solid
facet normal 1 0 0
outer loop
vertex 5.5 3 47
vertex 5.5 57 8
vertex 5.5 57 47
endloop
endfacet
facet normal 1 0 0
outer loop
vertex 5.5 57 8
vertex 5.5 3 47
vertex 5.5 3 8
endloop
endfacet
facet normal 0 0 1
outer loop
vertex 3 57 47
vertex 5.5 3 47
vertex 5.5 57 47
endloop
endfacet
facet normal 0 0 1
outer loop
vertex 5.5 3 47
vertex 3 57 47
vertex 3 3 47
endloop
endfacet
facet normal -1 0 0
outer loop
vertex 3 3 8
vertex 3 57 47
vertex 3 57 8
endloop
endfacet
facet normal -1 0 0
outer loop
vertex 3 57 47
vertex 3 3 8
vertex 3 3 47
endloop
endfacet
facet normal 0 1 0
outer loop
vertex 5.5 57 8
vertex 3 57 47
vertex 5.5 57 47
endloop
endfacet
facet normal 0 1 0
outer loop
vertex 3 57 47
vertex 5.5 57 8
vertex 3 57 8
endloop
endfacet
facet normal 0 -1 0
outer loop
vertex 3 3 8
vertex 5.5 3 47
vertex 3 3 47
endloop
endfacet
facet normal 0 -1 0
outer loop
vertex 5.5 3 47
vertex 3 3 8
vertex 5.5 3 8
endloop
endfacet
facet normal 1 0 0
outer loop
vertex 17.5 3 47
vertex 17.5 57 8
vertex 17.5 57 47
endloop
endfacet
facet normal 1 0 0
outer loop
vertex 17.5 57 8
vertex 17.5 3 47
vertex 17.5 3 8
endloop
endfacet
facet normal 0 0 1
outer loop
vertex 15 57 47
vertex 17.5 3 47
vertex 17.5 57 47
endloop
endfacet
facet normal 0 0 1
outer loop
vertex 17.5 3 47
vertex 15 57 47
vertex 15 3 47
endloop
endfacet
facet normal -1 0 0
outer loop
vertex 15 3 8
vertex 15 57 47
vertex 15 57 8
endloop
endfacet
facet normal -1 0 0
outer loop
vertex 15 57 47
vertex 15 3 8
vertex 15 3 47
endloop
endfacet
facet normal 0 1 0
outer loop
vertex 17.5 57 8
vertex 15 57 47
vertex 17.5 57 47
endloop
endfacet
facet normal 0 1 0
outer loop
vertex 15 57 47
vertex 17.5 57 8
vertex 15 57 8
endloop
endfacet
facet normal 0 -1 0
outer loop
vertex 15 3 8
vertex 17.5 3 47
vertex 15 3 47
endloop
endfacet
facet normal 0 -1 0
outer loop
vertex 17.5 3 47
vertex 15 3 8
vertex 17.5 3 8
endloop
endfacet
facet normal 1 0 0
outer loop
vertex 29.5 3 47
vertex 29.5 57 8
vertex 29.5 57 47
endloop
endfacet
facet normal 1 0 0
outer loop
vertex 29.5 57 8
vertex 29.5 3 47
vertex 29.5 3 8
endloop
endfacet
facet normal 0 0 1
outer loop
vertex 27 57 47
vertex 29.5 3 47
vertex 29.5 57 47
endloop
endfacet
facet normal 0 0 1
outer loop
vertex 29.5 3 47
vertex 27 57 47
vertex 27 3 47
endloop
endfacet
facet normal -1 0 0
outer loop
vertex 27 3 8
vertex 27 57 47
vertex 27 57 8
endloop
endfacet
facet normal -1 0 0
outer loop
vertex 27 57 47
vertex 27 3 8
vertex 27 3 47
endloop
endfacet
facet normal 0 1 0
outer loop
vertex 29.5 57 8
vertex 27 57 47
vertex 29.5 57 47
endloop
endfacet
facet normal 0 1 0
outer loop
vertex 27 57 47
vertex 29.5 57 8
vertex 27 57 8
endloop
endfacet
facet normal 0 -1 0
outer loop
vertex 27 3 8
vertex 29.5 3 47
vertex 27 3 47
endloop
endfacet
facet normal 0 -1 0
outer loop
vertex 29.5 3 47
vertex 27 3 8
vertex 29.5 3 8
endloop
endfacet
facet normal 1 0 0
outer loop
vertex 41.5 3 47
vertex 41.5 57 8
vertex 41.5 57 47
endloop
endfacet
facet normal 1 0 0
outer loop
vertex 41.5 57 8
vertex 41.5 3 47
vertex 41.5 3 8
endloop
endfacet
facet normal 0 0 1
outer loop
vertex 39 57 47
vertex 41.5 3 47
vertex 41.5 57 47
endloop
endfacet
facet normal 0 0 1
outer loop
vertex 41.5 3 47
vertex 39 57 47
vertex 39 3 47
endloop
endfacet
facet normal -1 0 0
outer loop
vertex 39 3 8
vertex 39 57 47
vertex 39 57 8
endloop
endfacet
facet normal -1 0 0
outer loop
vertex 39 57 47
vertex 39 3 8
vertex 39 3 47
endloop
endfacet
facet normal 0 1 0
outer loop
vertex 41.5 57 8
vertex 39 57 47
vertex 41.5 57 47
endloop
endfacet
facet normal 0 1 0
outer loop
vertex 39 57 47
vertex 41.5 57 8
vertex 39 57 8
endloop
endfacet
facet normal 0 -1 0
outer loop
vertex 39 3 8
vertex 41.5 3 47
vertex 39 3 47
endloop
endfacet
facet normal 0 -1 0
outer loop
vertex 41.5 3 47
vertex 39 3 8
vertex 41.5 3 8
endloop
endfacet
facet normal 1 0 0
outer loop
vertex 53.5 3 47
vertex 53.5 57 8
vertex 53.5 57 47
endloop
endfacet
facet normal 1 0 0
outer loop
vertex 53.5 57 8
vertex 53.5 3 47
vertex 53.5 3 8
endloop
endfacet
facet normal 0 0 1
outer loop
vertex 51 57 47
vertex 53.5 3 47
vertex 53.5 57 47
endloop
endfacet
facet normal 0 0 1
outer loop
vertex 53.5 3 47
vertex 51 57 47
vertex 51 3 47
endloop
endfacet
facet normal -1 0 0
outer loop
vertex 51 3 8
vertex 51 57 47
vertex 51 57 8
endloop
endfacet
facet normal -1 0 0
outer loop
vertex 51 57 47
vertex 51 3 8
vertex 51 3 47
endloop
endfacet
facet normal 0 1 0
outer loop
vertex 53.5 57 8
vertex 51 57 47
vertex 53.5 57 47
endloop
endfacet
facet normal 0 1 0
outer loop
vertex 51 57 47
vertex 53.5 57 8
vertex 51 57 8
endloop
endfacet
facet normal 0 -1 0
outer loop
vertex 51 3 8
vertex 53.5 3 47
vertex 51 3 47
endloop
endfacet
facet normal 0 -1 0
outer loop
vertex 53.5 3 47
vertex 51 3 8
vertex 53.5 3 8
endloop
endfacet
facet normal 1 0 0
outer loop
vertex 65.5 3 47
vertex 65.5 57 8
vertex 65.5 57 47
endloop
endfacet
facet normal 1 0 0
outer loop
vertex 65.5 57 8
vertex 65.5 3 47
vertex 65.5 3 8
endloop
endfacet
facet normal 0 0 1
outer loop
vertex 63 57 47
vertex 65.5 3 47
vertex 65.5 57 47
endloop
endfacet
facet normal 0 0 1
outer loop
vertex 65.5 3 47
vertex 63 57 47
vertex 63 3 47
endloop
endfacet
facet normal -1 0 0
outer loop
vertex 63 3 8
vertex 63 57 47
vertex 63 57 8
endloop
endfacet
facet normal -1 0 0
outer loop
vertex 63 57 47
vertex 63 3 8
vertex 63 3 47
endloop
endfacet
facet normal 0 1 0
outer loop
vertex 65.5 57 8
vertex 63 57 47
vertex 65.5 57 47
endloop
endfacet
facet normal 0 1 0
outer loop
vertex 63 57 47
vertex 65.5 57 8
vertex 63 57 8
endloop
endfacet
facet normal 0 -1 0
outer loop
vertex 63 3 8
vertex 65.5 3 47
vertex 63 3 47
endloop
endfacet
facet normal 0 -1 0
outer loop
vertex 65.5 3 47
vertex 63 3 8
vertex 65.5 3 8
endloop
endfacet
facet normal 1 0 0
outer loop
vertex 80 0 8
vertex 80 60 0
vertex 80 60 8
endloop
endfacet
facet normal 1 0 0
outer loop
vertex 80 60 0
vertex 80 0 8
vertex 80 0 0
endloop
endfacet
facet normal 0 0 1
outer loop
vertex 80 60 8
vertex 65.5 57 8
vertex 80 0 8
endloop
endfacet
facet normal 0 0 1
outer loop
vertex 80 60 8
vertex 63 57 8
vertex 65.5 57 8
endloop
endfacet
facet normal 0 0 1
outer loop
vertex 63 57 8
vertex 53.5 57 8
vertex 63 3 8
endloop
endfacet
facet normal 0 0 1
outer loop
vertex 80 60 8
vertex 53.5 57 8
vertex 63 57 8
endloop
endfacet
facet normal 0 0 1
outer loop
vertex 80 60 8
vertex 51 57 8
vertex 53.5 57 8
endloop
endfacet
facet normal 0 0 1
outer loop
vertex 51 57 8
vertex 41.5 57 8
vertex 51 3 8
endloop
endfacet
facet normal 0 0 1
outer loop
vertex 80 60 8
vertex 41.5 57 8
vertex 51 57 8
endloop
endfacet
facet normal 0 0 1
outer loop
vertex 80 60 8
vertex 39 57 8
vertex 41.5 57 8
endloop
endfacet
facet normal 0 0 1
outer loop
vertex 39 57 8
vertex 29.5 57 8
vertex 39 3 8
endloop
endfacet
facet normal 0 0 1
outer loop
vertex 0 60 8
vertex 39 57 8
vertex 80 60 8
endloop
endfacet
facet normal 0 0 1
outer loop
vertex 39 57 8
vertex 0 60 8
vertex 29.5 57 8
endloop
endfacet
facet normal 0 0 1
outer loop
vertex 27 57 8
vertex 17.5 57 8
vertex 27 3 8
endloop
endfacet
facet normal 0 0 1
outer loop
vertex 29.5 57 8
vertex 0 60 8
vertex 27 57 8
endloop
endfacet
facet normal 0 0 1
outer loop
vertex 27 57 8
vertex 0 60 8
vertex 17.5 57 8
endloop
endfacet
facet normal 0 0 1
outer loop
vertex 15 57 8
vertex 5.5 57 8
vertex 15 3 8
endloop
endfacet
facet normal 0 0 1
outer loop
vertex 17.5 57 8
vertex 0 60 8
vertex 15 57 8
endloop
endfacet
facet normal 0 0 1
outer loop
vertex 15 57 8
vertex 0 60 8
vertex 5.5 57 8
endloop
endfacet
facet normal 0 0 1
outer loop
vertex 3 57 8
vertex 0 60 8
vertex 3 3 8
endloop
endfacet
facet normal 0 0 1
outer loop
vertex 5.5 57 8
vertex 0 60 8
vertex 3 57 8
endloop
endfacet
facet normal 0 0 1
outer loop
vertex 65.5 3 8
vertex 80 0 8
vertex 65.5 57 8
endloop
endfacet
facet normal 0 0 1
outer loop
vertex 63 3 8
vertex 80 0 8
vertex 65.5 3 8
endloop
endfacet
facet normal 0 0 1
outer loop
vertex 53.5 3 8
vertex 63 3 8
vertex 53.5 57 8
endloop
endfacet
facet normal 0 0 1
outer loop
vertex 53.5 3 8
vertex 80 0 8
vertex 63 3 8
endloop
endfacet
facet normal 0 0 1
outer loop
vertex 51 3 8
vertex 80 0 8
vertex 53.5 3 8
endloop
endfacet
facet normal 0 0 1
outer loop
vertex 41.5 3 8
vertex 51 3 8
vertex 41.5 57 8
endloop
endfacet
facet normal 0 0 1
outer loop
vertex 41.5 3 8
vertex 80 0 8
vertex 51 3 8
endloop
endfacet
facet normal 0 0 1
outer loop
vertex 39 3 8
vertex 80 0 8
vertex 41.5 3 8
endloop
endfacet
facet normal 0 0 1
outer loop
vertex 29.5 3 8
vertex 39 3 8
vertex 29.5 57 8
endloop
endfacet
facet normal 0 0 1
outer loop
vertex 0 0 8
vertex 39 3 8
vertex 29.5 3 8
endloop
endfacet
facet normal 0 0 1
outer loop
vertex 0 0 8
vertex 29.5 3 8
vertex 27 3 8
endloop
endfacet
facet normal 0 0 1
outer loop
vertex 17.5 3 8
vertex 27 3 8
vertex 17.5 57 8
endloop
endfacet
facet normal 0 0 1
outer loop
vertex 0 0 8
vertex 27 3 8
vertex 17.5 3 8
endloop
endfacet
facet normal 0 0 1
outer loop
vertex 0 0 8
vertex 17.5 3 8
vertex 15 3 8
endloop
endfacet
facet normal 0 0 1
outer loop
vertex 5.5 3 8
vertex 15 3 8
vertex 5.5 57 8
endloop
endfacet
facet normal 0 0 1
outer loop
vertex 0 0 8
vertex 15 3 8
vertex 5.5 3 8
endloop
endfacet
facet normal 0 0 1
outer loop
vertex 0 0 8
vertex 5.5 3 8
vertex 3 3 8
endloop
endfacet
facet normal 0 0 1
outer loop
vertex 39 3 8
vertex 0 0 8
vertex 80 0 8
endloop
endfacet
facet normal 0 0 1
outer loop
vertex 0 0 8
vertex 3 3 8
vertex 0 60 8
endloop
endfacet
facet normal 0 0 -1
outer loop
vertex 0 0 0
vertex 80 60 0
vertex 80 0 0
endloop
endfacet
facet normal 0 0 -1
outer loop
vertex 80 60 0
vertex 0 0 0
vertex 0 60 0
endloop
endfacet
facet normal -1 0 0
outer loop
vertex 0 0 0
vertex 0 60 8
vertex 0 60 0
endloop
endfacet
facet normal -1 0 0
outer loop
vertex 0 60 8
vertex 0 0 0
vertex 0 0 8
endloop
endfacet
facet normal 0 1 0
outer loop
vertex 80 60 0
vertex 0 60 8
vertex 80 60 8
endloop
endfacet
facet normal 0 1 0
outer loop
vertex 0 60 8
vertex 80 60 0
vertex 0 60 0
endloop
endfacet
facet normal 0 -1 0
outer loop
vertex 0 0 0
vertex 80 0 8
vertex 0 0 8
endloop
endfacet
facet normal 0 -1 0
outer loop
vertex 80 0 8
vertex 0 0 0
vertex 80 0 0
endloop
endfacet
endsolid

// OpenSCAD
$fn = 32;

// ----------------------------------------------------------------------
// Heatsink: uniform fin block
// ----------------------------------------------------------------------

// --- parameters (mm) ---
base_l = 80;              // base length, X
base_w = 60;              // base width, Y
base_t = 8;               // base plate thickness
fin_h = 40;               // fin height above the base
fin_t = 2.5;              // fin thickness
edge = 3;                 // margin from the base ends
pitch = 12;               // fin pitch
fit_tol = 0.1;            // tolerance for press fits, mm
free_tol = 0.3;           // tolerance for clearance fits, mm

n_fins = floor((base_l - 2 * edge - fin_t) / pitch) + 1;  // fin count
total_h = base_t + fin_h - 1;  // overall height

union() {
  cube([base_l, base_w, base_t]);
  for (i = [0 : n_fins - 1])
    translate([edge + i * pitch, edge, base_t - 1])
      cube([fin_t, base_w - 2 * edge, fin_h]);
}
